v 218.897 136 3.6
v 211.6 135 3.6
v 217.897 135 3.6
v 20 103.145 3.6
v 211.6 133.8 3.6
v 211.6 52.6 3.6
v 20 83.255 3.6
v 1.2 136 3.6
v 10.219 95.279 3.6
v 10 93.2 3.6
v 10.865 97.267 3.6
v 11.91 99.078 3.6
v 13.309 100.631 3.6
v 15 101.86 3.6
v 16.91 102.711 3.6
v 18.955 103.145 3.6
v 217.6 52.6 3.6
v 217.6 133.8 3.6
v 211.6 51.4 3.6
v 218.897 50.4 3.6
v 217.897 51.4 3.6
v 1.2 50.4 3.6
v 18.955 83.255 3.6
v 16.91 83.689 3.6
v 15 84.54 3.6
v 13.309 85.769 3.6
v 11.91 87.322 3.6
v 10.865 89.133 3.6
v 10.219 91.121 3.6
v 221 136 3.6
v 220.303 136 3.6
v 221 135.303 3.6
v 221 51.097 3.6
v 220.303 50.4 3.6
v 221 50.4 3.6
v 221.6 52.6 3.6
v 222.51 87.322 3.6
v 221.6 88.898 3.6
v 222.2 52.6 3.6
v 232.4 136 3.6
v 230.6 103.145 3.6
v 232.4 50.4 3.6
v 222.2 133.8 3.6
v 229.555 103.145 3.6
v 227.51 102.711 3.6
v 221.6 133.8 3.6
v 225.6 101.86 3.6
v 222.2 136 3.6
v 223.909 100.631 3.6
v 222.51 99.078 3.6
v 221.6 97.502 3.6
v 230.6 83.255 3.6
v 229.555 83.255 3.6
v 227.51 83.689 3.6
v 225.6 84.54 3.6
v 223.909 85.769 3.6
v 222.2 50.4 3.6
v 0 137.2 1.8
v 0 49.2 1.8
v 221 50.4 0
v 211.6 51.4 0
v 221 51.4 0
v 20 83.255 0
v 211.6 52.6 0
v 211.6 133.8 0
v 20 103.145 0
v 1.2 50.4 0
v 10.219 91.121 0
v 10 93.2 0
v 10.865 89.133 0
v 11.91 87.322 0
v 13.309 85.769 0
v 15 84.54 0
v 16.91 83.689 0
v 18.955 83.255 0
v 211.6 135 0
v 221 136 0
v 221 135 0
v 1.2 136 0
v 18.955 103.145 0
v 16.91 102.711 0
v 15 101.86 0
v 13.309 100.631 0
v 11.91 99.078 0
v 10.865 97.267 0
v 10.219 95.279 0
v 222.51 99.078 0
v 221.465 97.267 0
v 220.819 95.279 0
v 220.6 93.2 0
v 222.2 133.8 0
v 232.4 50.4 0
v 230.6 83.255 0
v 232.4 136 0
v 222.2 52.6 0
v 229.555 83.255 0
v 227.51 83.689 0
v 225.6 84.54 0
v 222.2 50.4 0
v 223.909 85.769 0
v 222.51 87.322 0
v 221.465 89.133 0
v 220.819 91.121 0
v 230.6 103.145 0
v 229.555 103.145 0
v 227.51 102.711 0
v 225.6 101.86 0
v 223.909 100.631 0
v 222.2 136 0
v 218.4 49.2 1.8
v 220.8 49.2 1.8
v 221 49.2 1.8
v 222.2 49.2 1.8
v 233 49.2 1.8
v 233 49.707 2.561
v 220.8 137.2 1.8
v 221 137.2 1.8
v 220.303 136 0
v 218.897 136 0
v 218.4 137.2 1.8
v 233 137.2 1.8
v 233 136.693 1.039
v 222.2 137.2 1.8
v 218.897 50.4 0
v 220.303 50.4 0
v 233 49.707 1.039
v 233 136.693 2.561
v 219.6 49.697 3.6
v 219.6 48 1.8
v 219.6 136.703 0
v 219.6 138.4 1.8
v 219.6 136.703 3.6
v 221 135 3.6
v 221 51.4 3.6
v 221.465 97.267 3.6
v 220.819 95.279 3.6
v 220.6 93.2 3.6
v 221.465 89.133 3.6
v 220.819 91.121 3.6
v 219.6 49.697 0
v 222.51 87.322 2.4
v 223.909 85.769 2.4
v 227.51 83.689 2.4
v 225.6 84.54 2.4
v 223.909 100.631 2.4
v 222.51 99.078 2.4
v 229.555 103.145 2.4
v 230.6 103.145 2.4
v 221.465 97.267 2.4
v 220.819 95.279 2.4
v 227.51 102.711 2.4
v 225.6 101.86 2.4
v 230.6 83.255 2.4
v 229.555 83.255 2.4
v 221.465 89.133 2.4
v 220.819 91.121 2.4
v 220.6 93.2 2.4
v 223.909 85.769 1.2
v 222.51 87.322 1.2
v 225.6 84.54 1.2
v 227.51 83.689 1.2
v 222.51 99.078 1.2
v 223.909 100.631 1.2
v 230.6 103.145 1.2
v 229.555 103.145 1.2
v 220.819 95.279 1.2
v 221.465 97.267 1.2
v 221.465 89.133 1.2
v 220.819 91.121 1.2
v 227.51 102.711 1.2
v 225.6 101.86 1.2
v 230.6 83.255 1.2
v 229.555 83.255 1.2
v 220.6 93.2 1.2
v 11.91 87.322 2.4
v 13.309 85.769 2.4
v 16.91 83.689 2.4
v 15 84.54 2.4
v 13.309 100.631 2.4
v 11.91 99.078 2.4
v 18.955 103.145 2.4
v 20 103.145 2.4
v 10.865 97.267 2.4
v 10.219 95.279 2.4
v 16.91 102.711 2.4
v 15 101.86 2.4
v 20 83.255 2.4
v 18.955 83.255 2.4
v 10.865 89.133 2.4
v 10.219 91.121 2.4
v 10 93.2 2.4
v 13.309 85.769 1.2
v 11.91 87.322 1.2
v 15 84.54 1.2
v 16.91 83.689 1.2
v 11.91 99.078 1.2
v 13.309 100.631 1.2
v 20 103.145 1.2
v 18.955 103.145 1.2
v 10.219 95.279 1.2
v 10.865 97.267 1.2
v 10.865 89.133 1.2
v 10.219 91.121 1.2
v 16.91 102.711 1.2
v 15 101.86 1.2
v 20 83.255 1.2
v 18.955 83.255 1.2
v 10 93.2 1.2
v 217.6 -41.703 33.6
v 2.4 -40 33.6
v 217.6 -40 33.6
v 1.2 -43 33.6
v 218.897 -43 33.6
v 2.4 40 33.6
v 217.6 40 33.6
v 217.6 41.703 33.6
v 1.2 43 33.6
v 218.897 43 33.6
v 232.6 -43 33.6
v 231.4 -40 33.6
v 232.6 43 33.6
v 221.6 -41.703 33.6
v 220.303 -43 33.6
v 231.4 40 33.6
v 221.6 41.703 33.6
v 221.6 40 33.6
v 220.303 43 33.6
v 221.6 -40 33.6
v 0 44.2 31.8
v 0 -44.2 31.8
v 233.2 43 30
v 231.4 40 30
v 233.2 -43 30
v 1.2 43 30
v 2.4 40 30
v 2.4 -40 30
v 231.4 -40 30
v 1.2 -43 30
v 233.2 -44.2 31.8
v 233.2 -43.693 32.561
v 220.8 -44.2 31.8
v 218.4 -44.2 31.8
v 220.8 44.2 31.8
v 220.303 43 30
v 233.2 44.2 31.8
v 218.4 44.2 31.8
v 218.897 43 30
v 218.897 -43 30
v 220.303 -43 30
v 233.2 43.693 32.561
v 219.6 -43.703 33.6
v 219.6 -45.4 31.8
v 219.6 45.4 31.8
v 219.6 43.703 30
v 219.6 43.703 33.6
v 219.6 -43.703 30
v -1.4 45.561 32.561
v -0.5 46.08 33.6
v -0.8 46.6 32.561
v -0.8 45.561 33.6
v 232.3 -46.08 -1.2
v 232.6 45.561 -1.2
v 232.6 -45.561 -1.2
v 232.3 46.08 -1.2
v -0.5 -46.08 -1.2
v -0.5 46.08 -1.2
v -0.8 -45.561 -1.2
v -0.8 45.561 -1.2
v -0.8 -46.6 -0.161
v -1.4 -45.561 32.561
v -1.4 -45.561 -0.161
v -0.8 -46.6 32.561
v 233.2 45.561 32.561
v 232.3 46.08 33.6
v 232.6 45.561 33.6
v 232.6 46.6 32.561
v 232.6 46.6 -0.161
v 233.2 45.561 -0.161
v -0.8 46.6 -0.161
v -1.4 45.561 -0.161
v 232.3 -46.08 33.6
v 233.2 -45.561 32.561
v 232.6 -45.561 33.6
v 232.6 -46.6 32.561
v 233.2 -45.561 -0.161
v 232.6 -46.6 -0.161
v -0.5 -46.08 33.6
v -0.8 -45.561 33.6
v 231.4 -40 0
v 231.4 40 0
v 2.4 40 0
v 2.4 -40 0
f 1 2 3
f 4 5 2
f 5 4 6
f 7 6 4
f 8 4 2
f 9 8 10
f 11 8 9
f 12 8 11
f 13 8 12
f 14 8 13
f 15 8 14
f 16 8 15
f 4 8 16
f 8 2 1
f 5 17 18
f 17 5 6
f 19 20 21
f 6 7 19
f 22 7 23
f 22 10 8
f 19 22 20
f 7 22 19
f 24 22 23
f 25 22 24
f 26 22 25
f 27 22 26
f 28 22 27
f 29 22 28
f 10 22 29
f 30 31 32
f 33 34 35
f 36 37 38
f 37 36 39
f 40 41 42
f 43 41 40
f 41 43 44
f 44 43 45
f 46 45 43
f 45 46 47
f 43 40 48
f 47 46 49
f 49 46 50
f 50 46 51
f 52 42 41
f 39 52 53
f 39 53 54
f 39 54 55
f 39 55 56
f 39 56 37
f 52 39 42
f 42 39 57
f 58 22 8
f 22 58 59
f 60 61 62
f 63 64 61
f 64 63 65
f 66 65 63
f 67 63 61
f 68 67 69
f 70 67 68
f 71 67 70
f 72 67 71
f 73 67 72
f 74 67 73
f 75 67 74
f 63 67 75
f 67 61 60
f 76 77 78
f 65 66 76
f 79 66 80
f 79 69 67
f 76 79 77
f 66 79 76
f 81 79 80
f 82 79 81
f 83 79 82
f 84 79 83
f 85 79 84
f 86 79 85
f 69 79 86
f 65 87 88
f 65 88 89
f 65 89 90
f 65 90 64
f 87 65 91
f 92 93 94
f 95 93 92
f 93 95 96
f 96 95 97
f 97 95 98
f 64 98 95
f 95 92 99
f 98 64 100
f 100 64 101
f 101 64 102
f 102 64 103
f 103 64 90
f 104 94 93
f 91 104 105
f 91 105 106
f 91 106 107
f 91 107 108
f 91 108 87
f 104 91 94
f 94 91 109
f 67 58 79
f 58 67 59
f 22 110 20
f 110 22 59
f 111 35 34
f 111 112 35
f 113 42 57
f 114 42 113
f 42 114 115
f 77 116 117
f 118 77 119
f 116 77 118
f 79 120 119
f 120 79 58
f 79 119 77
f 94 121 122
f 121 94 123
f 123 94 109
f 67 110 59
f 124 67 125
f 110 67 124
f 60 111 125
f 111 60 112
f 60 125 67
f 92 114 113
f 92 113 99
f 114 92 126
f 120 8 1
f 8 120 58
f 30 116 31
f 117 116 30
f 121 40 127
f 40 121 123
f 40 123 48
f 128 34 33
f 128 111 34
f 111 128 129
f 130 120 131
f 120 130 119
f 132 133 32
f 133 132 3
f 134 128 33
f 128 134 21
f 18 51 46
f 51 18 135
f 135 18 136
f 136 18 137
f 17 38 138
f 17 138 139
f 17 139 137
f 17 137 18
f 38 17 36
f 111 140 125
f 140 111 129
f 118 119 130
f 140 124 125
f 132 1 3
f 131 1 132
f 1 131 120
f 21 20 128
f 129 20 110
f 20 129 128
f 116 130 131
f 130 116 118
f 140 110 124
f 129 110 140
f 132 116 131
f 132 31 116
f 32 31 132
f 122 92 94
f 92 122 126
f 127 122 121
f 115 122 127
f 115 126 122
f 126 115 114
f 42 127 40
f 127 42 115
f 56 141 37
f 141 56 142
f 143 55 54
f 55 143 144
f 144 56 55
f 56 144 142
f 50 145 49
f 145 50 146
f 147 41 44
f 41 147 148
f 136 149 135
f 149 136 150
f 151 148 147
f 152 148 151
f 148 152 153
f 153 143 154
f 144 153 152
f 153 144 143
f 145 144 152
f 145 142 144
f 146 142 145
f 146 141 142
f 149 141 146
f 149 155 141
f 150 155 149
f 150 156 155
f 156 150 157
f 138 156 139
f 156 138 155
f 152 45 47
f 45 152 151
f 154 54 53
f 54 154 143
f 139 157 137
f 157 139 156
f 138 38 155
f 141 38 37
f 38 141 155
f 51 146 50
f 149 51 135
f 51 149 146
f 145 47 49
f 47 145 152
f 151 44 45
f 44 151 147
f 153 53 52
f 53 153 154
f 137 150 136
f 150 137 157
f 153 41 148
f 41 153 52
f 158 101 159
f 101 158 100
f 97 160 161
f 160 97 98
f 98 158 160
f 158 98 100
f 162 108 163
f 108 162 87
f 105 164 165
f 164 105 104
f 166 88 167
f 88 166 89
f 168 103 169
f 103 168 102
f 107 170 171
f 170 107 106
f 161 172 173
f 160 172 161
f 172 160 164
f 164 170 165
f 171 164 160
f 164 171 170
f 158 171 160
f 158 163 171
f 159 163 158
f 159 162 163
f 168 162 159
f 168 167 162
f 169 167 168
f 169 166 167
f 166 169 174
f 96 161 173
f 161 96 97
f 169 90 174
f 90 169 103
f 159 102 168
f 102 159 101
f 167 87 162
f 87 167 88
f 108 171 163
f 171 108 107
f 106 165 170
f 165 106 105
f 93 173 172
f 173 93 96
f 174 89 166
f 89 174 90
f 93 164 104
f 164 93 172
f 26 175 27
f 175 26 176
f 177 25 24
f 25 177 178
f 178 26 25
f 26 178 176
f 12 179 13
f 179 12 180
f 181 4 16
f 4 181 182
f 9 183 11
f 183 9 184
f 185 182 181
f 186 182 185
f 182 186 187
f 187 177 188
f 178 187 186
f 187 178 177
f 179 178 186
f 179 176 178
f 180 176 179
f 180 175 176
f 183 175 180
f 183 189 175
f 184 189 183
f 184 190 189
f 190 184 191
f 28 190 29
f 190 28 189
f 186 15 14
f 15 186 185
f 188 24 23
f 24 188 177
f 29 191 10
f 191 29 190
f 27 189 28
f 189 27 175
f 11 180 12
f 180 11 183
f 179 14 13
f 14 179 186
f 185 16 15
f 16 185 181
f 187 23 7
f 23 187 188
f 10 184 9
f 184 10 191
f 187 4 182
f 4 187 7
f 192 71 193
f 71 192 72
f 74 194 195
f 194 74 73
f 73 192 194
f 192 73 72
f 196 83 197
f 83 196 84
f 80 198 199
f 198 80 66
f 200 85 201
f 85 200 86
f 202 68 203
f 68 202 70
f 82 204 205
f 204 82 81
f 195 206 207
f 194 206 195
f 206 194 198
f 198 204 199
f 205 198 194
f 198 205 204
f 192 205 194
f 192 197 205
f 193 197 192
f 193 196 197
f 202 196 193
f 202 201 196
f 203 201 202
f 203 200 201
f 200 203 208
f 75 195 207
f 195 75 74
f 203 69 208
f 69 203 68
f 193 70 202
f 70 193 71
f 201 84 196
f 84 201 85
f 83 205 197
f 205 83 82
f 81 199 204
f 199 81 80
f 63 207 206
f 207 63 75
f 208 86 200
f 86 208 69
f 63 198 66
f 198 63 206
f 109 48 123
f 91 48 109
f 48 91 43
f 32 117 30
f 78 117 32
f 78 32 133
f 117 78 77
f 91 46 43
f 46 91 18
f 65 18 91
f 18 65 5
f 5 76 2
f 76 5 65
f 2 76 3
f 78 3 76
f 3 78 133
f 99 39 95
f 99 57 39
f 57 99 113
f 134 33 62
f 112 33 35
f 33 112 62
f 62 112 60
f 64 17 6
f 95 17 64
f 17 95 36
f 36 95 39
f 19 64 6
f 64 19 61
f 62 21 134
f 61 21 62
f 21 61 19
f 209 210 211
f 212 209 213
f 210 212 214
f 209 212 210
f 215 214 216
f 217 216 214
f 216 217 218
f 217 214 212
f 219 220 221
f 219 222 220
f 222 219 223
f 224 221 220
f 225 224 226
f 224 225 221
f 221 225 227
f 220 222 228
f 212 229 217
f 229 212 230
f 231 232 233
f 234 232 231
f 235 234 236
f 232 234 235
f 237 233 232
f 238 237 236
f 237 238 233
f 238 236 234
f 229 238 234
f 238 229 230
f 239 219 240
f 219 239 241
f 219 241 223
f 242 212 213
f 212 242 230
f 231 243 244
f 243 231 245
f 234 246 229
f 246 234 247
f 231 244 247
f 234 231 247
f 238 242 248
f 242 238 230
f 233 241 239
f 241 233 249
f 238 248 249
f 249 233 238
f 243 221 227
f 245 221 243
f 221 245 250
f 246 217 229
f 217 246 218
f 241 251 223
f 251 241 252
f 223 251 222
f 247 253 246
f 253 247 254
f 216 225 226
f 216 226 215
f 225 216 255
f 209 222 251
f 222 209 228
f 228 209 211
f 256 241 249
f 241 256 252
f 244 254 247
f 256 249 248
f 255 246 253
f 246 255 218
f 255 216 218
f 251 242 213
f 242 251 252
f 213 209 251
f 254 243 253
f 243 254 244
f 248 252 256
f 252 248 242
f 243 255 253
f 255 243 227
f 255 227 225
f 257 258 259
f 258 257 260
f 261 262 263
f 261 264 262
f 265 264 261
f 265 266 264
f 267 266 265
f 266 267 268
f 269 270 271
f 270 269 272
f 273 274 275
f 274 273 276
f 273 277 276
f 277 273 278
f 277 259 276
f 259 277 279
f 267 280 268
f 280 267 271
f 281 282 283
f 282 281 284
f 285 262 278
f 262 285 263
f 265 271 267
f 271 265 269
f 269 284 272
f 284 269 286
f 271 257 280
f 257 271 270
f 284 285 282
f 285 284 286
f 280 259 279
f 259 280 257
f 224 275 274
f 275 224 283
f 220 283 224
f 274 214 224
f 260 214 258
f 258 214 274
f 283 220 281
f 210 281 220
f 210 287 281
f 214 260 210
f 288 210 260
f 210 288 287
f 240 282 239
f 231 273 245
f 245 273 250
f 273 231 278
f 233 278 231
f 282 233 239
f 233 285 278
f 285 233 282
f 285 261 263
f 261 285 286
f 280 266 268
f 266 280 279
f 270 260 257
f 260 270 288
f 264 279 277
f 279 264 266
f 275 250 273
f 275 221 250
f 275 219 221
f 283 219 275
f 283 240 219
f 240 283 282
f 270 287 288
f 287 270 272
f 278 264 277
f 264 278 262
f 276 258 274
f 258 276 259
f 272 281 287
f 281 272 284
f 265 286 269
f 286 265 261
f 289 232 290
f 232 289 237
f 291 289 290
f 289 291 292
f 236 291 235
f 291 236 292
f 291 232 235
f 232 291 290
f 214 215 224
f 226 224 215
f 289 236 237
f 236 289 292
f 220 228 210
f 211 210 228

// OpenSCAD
// inner cavity length (slider moves along this dimention
INNER_L= 229; // [55:350]
INNER_W= 80; // [20:250]
INNER_H= 30; // [350]

// Tollerance
TOL= 0.2; // [0.1, 0.2, 0.3, 0.4]
// minimal wall thickness
WALL1= 1.2; //[1, 1.2, 1.5, 1.6, 2]
// Size of the latch
LATCH= 1.2; //[0.5, 0.8, 1, 1.2, 1.5, 1.6, 2]
// Latch cut from the center of the latch
PIN_D= 2;
// Length of the latch cut
PIN_L= 10;
// Diameter of cut for "nail" on sliding lid
NAIL_D= 20;

/* [Hidden] */
WALL_SIDE1= WALL1*3 + LATCH*2 + TOL*2;
WALL_SIDE2= WALL1*2 + TOL;
WALL_BOTTOM= WALL1;
WALL_TOP= WALL1*3;


OUTER_R= WALL1;
OUTER_F= 6;

OUTER_L= WALL_SIDE2*2 + INNER_L + 2*TOL;
OUTER_W= WALL_SIDE1*2 + INNER_W + 2*TOL;
OUTER_H= WALL_BOTTOM + WALL_TOP + INNER_H;

PIN= OUTER_L - 15;


module round_cube(l, w, h, r, f)
{
    $fn= f;
    minkowski()
    {
        cube([l - r*2, w - r*2*cos(180/f), h - r*2*cos(180/f)], center= true);
        sphere(r= r);
    }
}


module slide(l, w, h)
{
    linear_extrude(l)
    polygon(points=
            [[w/2-WALL1,    -h/2],
             [w/2,          0],
             [w/2-WALL1,    h/2],
             [-(w/2-WALL1), h/2],
             [-w/2,         0],
             [-(w/2-WALL1), -h/2]]);
}


module lid_basic(l, w, h)
{
    ll= l - WALL1;

    translate([WALL1, 0, h/2])
    rotate([0, 90, 0])
    rotate(90)
    slide(l= ll, w= w, h= h);

    intersection()
    {
        rotate([90, 0, 0])
        translate([(WALL1*2 + 1)/2, h/2, -w])
        slide(w= WALL1*2 + 1, l= w*2, h= h);

        translate([0, 0, h/2])
        rotate([0, 90, 0])
        rotate(90)
        slide(l= ll, w= w, h= h);
    }

    translate([PIN, 0, h/2])
    intersection()
    {
        vv= (w + 2*LATCH)/sqrt(2);
        rotate(45)
        rotate([0, 90, 0])
        rotate(90)
        translate([0, 0, -vv/2])
        slide(l= vv, w= vv, h= h);

        rotate(-45)
        rotate([0, 90, 0])
        rotate(90)
        translate([0, 0, -vv/2])
        slide(l= vv, w= vv, h= h);

        cube([PIN_D*2, vv*3, h*3], center= true);
    }
}


module lid()
{
    difference()
    {
        intersection()
        {
            lid_basic(l= OUTER_L - TOL*2 - WALL1, w= OUTER_W-(WALL1+LATCH)*2 - TOL*2, h= WALL1*3);
            translate([0, 0, WALL1*3/2])
            round_cube(l= (OUTER_L - TOL*2 - WALL1)*2 , w= (OUTER_W-(WALL1+LATCH)*2 - TOL*2)*2, h= WALL1*3, r= OUTER_R, f= OUTER_F);
        }

        translate([PIN + PIN_D, -(WALL1*2+LATCH)/2 + (OUTER_W-(WALL1+LATCH)*2)/2, 0])
        cube([LATCH, WALL1*2+LATCH, WALL1*3*3], center=true);

        translate([-PIN_L/2 + PIN + PIN_D, -LATCH/2 + ((OUTER_W-(WALL1+LATCH)*2)/2 - WALL1*2), 0])
        cube([PIN_L, LATCH, WALL1*3*3], center=true);

        translate([PIN + PIN_D, (WALL1*2+LATCH)/2 - (OUTER_W-(WALL1+LATCH)*2)/2, 0])
        cube([LATCH, WALL1*2+LATCH, WALL1*3*3], center=true);
        translate([-PIN_L/2 + PIN + PIN_D, LATCH/2 - ((OUTER_W-(WALL1+LATCH)*2)/2 - WALL1*2), 0])
        cube([PIN_L, LATCH, WALL1*3*3], center=true);

        translate([OUTER_L - TOL*2 - WALL1 -WALL1*2, 0, WALL1*2])
        half_cylinder(h= WALL1, d= NAIL_D);
        translate([OUTER_L - TOL*2 - WALL1 -WALL1*2, 0, 0])
        half_cylinder(h= WALL1, d= NAIL_D);

        translate([NAIL_D, 0, WALL1*2])
        half_cylinder(h= WALL1, d= NAIL_D);
        translate([NAIL_D, 0, 0])
        half_cylinder(h= WALL1, d= NAIL_D);
    }
}


module half_cylinder(h, d)
{
    difference()
    {
        cylinder(h= h, d= d);

        translate([d/2, 0, 0])
        cube([d, d, h*3], center= true);
    }
}


module box()
{
    difference()
    {
        translate([OUTER_L/2 - (WALL_SIDE2- WALL1), 0, OUTER_H/2 - WALL_BOTTOM])
        round_cube(l= OUTER_L, w= OUTER_W, h= OUTER_H, r= OUTER_R, f= OUTER_F);

        translate([(INNER_L)/2 + WALL1*2, 0, INNER_H])
        cube([INNER_L, INNER_W, INNER_H*2], center=true);

        translate([0, 0, INNER_H])
        lid_basic(l= OUTER_L, w= OUTER_W-(WALL1+LATCH)*2 , h= WALL1*3);
    }
}


translate([/*OUTER_L*/ 0, OUTER_W /*0*/, 0 /*INNER_H*/])
lid();
box();
